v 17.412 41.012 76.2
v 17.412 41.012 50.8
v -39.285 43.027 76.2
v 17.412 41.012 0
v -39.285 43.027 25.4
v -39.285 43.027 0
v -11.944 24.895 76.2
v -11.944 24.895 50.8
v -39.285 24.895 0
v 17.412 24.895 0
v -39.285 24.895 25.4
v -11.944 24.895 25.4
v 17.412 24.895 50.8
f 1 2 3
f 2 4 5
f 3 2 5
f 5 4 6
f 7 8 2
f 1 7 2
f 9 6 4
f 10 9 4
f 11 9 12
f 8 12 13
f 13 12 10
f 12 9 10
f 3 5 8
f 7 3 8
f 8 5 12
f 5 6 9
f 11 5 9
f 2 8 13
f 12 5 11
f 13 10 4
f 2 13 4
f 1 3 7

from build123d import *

# Parameters (mm, degrees)
F1_DEPTH = 25.4
F2_DEPTH = 76.2
F3_DEPTH = 50.8


with BuildPart() as f1:
    # F0 (on Top) → F1 (new body)
    with BuildSketch(Plane.XY):
        Polygon((-39.285485, 43.026961), (-39.285485, 24.895199), (-11.943938, 24.895199), align=None)
    extrude(amount=F1_DEPTH)

    # F0 (on Top) → F2 (join)
    with BuildSketch(Plane.XY):
        Polygon((-39.285485, 43.026961), (-11.943938, 24.895199), (17.412249, 41.012321), align=None)
    extrude(amount=F2_DEPTH)

    # F0 (on Top) → F3 (join)
    with BuildSketch(Plane.XY):
        Polygon((17.412249, 41.012321), (-11.943938, 24.895199), (17.412249, 24.895199), align=None)
    extrude(amount=F3_DEPTH)


solid = f1.part
